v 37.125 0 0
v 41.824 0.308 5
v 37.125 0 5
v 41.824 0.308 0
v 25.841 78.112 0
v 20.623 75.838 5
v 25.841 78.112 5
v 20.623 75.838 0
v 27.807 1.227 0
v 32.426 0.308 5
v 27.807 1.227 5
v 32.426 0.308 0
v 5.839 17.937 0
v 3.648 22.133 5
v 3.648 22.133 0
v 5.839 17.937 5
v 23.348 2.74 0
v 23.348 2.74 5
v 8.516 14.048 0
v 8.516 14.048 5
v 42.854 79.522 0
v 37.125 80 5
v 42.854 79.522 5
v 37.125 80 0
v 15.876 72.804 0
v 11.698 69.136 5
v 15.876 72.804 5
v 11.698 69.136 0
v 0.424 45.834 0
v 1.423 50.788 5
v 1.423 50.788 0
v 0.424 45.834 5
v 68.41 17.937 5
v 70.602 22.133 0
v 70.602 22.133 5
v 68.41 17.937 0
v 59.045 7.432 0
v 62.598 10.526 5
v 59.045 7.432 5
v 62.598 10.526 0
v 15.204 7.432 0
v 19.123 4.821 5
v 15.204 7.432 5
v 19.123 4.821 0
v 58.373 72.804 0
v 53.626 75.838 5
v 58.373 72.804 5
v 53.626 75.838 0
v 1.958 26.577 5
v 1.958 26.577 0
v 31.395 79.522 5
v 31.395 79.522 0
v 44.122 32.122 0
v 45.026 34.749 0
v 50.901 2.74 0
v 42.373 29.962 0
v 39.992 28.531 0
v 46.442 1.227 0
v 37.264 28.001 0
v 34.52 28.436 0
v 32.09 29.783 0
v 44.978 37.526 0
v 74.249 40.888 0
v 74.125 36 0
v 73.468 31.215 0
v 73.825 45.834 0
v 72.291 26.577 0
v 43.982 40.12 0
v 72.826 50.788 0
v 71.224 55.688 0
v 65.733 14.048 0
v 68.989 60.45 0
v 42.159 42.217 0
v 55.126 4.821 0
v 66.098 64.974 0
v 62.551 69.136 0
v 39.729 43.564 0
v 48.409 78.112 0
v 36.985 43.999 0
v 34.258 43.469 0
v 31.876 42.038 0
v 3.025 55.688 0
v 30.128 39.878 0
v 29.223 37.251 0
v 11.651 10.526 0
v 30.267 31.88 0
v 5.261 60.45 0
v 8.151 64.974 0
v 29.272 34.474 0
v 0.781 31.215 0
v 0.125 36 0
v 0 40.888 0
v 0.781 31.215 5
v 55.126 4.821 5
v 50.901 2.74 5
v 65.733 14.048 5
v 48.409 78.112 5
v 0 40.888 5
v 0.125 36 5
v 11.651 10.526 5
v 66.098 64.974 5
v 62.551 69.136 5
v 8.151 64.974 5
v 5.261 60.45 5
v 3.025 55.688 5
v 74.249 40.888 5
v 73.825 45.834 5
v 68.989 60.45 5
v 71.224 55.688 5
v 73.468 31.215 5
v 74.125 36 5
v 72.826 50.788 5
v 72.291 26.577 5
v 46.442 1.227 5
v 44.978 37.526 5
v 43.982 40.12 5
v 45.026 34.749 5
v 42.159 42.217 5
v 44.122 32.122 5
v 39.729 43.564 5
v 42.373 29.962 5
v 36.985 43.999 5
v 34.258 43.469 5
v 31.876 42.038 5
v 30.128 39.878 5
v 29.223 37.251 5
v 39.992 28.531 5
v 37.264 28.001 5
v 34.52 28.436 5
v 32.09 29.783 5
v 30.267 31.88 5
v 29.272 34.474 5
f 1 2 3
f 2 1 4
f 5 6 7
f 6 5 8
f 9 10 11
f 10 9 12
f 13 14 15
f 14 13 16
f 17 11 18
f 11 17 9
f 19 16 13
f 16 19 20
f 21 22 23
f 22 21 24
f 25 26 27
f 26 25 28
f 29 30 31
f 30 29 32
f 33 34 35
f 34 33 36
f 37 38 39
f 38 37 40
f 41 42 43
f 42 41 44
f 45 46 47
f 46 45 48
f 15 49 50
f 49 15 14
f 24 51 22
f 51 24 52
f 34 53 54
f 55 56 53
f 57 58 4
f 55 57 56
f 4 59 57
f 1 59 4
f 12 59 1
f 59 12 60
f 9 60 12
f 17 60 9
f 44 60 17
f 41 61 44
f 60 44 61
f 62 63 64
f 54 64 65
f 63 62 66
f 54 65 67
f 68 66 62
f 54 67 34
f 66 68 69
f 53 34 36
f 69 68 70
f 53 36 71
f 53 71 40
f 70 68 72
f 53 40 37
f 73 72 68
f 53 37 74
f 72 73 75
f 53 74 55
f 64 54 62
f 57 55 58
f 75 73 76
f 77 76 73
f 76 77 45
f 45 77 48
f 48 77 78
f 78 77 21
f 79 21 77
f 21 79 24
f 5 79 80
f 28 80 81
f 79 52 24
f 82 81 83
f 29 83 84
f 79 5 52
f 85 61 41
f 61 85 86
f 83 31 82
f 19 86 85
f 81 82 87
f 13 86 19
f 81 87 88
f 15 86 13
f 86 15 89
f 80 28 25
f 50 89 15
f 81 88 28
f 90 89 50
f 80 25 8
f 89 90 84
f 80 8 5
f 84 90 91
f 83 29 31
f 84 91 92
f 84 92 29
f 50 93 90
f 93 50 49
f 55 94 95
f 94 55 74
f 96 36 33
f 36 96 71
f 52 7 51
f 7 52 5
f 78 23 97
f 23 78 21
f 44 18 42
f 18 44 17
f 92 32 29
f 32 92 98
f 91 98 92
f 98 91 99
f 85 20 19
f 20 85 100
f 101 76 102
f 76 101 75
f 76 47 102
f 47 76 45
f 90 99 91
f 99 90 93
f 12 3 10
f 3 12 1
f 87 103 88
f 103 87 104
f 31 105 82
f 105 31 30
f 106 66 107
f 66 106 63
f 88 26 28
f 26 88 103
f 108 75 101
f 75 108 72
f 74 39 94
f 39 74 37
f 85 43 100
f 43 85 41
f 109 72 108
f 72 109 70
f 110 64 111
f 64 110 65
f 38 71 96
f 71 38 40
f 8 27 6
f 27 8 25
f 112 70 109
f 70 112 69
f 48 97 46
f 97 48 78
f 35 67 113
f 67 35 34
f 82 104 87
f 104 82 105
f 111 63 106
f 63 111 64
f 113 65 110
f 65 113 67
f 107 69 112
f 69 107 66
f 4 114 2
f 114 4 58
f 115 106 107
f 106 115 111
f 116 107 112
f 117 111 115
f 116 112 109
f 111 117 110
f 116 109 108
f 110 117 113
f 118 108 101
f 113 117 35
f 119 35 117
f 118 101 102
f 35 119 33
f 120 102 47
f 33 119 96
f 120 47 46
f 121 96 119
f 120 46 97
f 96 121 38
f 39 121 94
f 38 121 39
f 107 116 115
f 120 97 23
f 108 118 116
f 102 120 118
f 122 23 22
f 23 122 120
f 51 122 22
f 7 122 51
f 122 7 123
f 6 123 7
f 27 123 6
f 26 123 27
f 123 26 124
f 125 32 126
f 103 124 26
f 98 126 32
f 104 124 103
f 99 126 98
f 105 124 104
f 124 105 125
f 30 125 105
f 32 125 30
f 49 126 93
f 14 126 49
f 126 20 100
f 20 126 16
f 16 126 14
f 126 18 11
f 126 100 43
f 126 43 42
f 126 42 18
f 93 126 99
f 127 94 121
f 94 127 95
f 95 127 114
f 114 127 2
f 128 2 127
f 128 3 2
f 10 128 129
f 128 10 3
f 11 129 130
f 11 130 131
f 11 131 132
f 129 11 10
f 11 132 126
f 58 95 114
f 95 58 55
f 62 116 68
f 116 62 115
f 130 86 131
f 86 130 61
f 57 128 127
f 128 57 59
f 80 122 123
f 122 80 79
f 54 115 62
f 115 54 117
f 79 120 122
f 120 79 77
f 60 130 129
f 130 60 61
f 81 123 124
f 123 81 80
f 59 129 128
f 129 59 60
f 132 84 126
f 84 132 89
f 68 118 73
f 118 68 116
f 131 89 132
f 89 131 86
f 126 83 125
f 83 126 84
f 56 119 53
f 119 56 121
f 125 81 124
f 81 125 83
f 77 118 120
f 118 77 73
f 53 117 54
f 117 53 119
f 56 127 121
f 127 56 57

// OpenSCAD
$fn = 32;

// ----------------------------------------------------------------------
// Cam plate: single_lobe cam, base R36
// ----------------------------------------------------------------------

// --- parameters (mm) ---
base_r = 36;              // base circle radius
lobe_h = 8;               // cam lobe rise
bore_r = 8;               // shaft bore radius
plate_t = 5;              // plate thickness, Z (extrusion height)

profile = [[74.125, 36], [74.249, 40.888], [73.825, 45.834], [72.826, 50.788], [71.224, 55.688], [68.989, 60.45], [66.098, 64.974], [62.551, 69.136], [58.373, 72.804], [53.626, 75.838], [48.409, 78.112], [42.854, 79.522], [37.125, 80], [31.395, 79.522], [25.841, 78.112], [20.623, 75.838], [15.876, 72.804], [11.698, 69.136], [8.151, 64.974], [5.261, 60.45], [3.025, 55.688], [1.423, 50.788], [0.424, 45.834], [0, 40.888], [0.125, 36], [0.781, 31.215], [1.958, 26.577], [3.648, 22.133], [5.839, 17.937], [8.516, 14.048], [11.651, 10.526], [15.204, 7.432], [19.123, 4.821], [23.348, 2.74], [27.807, 1.227], [32.426, 0.308], [37.125, 0], [41.824, 0.308], [46.442, 1.227], [50.901, 2.74], [55.126, 4.821], [59.045, 7.432], [62.598, 10.526], [65.733, 14.048], [68.41, 17.937], [70.602, 22.133], [72.291, 26.577], [73.468, 31.215]];  // primary outline, 48 points, counter clockwise
void_1 = [[44.978, 37.526], [43.982, 40.12], [42.159, 42.217], [39.729, 43.564], [36.985, 43.999], [34.258, 43.469], [31.876, 42.038], [30.128, 39.878], [29.223, 37.251], [29.272, 34.474], [30.267, 31.88], [32.09, 29.783], [34.52, 28.436], [37.264, 28.001], [39.992, 28.531], [42.373, 29.962], [44.122, 32.122], [45.026, 34.749]];  // shaft bore, 18 points

// --- the one profile operation ---
difference() {
  linear_extrude(height = plate_t) polygon(points = profile);
  translate([0, 0, -1])
    linear_extrude(height = plate_t + 2) polygon(points = void_1);
}
